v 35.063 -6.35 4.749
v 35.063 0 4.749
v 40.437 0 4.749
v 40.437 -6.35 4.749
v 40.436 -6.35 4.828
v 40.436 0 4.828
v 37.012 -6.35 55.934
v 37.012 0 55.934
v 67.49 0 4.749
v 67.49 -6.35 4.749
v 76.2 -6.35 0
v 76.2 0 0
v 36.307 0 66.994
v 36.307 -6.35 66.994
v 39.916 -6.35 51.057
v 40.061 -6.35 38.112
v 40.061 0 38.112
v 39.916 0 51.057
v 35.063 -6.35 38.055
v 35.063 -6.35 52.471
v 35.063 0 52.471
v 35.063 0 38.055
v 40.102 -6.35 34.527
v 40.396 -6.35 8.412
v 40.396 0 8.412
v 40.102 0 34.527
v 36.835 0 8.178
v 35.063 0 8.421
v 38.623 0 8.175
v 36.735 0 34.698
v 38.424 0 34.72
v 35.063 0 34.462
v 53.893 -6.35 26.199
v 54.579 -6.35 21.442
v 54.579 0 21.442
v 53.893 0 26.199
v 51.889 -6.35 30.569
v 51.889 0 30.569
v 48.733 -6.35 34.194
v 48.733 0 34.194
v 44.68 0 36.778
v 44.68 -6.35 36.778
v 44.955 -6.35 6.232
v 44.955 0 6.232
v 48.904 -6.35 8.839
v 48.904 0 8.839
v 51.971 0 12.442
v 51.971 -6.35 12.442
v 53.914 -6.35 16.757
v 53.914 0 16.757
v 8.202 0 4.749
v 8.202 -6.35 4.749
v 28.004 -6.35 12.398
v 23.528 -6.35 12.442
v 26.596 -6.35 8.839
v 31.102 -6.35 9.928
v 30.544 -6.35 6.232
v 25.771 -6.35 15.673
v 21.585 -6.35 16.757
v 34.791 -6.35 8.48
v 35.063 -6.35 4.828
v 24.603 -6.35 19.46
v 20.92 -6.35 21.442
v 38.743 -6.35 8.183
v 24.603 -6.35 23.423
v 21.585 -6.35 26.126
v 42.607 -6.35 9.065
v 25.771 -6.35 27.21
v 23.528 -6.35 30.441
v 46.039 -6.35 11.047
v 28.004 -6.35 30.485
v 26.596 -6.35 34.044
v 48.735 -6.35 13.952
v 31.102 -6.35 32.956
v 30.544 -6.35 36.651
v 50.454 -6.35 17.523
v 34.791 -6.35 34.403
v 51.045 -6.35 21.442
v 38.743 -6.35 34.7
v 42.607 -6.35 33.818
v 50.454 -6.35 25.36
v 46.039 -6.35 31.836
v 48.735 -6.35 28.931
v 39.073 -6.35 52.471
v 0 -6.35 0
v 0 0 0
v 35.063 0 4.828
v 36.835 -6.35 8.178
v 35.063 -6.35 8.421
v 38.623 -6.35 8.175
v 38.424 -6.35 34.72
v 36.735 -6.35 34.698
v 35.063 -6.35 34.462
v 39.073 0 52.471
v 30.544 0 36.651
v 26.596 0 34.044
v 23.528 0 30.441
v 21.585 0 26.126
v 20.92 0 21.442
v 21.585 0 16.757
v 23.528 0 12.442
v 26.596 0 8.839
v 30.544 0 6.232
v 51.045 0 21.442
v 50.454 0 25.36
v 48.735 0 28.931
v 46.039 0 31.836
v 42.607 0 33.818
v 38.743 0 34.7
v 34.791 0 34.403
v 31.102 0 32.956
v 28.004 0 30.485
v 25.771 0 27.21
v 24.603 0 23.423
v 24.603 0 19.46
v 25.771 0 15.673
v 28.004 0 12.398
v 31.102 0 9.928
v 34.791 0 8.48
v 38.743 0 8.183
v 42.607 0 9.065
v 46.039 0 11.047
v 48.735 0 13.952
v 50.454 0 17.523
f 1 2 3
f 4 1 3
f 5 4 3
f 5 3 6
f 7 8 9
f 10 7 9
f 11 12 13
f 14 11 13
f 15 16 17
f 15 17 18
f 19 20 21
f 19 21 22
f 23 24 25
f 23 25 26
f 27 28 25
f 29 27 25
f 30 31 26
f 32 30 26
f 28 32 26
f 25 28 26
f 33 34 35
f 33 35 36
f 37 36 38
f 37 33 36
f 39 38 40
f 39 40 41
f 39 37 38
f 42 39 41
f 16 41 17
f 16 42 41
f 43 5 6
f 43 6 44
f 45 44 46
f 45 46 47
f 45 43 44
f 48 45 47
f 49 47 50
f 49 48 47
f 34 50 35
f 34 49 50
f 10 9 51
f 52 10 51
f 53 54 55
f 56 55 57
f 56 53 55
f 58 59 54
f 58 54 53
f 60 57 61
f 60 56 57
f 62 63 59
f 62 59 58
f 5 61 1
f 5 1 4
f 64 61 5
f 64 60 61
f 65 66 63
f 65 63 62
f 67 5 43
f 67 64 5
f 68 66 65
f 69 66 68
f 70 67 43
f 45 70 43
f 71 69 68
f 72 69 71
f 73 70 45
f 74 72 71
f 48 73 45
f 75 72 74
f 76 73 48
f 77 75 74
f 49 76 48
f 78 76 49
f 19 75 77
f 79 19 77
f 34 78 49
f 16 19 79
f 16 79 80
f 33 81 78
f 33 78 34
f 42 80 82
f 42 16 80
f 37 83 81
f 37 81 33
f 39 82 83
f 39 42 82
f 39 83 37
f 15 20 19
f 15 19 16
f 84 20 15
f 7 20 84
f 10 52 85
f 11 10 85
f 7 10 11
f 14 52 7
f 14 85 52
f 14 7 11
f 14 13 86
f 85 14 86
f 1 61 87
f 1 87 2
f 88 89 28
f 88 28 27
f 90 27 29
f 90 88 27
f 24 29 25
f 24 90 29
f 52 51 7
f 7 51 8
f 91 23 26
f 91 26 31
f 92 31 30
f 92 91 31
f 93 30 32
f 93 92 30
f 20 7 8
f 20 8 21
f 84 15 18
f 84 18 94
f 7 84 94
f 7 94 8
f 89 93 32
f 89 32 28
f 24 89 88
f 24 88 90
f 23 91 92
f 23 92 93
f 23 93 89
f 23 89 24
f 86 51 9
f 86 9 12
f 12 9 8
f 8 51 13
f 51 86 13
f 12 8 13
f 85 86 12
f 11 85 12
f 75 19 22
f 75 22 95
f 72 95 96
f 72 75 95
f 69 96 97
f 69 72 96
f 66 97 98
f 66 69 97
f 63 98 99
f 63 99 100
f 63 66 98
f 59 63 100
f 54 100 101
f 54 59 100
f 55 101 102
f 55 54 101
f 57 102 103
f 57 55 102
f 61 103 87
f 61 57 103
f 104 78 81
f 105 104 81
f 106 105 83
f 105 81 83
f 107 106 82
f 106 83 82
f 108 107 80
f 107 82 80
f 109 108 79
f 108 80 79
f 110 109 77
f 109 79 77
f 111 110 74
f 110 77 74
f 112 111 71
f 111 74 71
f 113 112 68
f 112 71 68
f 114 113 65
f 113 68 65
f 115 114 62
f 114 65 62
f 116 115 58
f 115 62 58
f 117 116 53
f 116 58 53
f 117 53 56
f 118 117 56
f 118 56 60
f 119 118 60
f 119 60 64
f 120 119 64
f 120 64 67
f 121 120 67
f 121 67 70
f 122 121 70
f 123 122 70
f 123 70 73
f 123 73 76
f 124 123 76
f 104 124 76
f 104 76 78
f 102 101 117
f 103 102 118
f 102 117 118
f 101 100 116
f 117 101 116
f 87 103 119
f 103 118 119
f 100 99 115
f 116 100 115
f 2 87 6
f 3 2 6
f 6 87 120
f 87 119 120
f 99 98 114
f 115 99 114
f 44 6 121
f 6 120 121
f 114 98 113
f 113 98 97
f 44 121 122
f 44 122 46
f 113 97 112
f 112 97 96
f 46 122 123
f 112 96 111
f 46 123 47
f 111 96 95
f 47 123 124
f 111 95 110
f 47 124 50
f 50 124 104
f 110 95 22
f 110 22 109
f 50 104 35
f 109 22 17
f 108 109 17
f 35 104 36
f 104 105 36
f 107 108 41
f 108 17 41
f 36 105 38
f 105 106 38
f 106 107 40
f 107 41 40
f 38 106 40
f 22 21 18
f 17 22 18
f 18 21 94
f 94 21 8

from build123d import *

# Parameters (mm, degrees)
F1_DEPTH = 6.35
F3_DEPTH = 6.35
F5_DEPTH = 6.35
F6_R     = 13.2952502856
F7_DEPTH = 25.4
F9_DEPTH = 6.35


with BuildPart() as f1:
    # F0 (on Front) → F1 (new body)
    with BuildSketch(Plane.XZ):
        Polygon((36.3074574453, 66.9940932759), (0, 0), (76.2, 0), align=None)
        Polygon((67.4904510379, 4.7487951815), (8.2024643198, 4.7487951815), (37.0116555081, 55.9337821464), align=None, mode=Mode.SUBTRACT)
    extrude(amount=F1_DEPTH)


with BuildPart() as f3:
    # F2 (on face) → F3 (new body)
    with BuildSketch(Plane.XZ.offset(6.35)):
        Polygon((39.0733871817, 52.4713845351), (35.0628638669, 52.4713845351), (35.0628638669, 4.7487951815), (40.4367111623, 4.7487951815), (39.9158214659, 51.0566308643), align=None)
        Polygon((37.0116555081, 55.9337821464), (35.0628638669, 52.4713845351), (39.0733871817, 52.4713845351), align=None)
    extrude(amount=-F3_DEPTH)

    # F4 (on face) → F5 (join)
    with BuildSketch(Plane.XZ.offset(6.35)):
        with BuildLine():
            Line((35.0628638669, 4.8278480664), (35.0628638669, 38.0552090809))
            ThreePointArc((35.0628638669, 38.0552090809), (20.920232004, 21.4415285736), (35.0628638669, 4.8278480664))
        make_face()
        with BuildLine():
            ThreePointArc((40.4358235572, 4.8277045387), (50.5645979183, 10.532148527), (54.5793430252, 21.4415285736))
            ThreePointArc((54.5793430252, 21.4415285736), (50.4410818285, 32.4943556926), (40.0614328825, 38.1115685969))
            Line((40.0614328825, 38.1115685969), (40.4358235572, 4.8277045387))
        make_face()
    extrude(amount=-F5_DEPTH)

    # F6 (on face) → F7 (cut)
    with BuildSketch(Plane.XZ.offset(6.35)):
        with Locations((37.7497875146, 21.4415285736)):
            Circle(F6_R)
    extrude(amount=-F7_DEPTH, mode=Mode.SUBTRACT)


with BuildPart() as f9:
    # F8 (on face) → F9 (new body)
    with BuildSketch(Plane.XZ.offset(6.35)):
        with BuildLine():
            ThreePointArc((40.1017525712, 34.5270908668), (37.5792171065, 34.7356846541), (35.0628638669, 34.4624395044))
            Line((35.0628638669, 34.4624395044), (35.0628638669, 8.4206176429))
            ThreePointArc((35.0628638669, 8.4206176429), (37.7287566052, 8.1462949218), (40.3955038686, 8.4121822688))
            Line((40.3955038686, 8.4121822688), (40.1017525712, 34.5270908668))
        make_face()
    extrude(amount=-F9_DEPTH)


solid = Compound([f1.part, f3.part, f9.part])
